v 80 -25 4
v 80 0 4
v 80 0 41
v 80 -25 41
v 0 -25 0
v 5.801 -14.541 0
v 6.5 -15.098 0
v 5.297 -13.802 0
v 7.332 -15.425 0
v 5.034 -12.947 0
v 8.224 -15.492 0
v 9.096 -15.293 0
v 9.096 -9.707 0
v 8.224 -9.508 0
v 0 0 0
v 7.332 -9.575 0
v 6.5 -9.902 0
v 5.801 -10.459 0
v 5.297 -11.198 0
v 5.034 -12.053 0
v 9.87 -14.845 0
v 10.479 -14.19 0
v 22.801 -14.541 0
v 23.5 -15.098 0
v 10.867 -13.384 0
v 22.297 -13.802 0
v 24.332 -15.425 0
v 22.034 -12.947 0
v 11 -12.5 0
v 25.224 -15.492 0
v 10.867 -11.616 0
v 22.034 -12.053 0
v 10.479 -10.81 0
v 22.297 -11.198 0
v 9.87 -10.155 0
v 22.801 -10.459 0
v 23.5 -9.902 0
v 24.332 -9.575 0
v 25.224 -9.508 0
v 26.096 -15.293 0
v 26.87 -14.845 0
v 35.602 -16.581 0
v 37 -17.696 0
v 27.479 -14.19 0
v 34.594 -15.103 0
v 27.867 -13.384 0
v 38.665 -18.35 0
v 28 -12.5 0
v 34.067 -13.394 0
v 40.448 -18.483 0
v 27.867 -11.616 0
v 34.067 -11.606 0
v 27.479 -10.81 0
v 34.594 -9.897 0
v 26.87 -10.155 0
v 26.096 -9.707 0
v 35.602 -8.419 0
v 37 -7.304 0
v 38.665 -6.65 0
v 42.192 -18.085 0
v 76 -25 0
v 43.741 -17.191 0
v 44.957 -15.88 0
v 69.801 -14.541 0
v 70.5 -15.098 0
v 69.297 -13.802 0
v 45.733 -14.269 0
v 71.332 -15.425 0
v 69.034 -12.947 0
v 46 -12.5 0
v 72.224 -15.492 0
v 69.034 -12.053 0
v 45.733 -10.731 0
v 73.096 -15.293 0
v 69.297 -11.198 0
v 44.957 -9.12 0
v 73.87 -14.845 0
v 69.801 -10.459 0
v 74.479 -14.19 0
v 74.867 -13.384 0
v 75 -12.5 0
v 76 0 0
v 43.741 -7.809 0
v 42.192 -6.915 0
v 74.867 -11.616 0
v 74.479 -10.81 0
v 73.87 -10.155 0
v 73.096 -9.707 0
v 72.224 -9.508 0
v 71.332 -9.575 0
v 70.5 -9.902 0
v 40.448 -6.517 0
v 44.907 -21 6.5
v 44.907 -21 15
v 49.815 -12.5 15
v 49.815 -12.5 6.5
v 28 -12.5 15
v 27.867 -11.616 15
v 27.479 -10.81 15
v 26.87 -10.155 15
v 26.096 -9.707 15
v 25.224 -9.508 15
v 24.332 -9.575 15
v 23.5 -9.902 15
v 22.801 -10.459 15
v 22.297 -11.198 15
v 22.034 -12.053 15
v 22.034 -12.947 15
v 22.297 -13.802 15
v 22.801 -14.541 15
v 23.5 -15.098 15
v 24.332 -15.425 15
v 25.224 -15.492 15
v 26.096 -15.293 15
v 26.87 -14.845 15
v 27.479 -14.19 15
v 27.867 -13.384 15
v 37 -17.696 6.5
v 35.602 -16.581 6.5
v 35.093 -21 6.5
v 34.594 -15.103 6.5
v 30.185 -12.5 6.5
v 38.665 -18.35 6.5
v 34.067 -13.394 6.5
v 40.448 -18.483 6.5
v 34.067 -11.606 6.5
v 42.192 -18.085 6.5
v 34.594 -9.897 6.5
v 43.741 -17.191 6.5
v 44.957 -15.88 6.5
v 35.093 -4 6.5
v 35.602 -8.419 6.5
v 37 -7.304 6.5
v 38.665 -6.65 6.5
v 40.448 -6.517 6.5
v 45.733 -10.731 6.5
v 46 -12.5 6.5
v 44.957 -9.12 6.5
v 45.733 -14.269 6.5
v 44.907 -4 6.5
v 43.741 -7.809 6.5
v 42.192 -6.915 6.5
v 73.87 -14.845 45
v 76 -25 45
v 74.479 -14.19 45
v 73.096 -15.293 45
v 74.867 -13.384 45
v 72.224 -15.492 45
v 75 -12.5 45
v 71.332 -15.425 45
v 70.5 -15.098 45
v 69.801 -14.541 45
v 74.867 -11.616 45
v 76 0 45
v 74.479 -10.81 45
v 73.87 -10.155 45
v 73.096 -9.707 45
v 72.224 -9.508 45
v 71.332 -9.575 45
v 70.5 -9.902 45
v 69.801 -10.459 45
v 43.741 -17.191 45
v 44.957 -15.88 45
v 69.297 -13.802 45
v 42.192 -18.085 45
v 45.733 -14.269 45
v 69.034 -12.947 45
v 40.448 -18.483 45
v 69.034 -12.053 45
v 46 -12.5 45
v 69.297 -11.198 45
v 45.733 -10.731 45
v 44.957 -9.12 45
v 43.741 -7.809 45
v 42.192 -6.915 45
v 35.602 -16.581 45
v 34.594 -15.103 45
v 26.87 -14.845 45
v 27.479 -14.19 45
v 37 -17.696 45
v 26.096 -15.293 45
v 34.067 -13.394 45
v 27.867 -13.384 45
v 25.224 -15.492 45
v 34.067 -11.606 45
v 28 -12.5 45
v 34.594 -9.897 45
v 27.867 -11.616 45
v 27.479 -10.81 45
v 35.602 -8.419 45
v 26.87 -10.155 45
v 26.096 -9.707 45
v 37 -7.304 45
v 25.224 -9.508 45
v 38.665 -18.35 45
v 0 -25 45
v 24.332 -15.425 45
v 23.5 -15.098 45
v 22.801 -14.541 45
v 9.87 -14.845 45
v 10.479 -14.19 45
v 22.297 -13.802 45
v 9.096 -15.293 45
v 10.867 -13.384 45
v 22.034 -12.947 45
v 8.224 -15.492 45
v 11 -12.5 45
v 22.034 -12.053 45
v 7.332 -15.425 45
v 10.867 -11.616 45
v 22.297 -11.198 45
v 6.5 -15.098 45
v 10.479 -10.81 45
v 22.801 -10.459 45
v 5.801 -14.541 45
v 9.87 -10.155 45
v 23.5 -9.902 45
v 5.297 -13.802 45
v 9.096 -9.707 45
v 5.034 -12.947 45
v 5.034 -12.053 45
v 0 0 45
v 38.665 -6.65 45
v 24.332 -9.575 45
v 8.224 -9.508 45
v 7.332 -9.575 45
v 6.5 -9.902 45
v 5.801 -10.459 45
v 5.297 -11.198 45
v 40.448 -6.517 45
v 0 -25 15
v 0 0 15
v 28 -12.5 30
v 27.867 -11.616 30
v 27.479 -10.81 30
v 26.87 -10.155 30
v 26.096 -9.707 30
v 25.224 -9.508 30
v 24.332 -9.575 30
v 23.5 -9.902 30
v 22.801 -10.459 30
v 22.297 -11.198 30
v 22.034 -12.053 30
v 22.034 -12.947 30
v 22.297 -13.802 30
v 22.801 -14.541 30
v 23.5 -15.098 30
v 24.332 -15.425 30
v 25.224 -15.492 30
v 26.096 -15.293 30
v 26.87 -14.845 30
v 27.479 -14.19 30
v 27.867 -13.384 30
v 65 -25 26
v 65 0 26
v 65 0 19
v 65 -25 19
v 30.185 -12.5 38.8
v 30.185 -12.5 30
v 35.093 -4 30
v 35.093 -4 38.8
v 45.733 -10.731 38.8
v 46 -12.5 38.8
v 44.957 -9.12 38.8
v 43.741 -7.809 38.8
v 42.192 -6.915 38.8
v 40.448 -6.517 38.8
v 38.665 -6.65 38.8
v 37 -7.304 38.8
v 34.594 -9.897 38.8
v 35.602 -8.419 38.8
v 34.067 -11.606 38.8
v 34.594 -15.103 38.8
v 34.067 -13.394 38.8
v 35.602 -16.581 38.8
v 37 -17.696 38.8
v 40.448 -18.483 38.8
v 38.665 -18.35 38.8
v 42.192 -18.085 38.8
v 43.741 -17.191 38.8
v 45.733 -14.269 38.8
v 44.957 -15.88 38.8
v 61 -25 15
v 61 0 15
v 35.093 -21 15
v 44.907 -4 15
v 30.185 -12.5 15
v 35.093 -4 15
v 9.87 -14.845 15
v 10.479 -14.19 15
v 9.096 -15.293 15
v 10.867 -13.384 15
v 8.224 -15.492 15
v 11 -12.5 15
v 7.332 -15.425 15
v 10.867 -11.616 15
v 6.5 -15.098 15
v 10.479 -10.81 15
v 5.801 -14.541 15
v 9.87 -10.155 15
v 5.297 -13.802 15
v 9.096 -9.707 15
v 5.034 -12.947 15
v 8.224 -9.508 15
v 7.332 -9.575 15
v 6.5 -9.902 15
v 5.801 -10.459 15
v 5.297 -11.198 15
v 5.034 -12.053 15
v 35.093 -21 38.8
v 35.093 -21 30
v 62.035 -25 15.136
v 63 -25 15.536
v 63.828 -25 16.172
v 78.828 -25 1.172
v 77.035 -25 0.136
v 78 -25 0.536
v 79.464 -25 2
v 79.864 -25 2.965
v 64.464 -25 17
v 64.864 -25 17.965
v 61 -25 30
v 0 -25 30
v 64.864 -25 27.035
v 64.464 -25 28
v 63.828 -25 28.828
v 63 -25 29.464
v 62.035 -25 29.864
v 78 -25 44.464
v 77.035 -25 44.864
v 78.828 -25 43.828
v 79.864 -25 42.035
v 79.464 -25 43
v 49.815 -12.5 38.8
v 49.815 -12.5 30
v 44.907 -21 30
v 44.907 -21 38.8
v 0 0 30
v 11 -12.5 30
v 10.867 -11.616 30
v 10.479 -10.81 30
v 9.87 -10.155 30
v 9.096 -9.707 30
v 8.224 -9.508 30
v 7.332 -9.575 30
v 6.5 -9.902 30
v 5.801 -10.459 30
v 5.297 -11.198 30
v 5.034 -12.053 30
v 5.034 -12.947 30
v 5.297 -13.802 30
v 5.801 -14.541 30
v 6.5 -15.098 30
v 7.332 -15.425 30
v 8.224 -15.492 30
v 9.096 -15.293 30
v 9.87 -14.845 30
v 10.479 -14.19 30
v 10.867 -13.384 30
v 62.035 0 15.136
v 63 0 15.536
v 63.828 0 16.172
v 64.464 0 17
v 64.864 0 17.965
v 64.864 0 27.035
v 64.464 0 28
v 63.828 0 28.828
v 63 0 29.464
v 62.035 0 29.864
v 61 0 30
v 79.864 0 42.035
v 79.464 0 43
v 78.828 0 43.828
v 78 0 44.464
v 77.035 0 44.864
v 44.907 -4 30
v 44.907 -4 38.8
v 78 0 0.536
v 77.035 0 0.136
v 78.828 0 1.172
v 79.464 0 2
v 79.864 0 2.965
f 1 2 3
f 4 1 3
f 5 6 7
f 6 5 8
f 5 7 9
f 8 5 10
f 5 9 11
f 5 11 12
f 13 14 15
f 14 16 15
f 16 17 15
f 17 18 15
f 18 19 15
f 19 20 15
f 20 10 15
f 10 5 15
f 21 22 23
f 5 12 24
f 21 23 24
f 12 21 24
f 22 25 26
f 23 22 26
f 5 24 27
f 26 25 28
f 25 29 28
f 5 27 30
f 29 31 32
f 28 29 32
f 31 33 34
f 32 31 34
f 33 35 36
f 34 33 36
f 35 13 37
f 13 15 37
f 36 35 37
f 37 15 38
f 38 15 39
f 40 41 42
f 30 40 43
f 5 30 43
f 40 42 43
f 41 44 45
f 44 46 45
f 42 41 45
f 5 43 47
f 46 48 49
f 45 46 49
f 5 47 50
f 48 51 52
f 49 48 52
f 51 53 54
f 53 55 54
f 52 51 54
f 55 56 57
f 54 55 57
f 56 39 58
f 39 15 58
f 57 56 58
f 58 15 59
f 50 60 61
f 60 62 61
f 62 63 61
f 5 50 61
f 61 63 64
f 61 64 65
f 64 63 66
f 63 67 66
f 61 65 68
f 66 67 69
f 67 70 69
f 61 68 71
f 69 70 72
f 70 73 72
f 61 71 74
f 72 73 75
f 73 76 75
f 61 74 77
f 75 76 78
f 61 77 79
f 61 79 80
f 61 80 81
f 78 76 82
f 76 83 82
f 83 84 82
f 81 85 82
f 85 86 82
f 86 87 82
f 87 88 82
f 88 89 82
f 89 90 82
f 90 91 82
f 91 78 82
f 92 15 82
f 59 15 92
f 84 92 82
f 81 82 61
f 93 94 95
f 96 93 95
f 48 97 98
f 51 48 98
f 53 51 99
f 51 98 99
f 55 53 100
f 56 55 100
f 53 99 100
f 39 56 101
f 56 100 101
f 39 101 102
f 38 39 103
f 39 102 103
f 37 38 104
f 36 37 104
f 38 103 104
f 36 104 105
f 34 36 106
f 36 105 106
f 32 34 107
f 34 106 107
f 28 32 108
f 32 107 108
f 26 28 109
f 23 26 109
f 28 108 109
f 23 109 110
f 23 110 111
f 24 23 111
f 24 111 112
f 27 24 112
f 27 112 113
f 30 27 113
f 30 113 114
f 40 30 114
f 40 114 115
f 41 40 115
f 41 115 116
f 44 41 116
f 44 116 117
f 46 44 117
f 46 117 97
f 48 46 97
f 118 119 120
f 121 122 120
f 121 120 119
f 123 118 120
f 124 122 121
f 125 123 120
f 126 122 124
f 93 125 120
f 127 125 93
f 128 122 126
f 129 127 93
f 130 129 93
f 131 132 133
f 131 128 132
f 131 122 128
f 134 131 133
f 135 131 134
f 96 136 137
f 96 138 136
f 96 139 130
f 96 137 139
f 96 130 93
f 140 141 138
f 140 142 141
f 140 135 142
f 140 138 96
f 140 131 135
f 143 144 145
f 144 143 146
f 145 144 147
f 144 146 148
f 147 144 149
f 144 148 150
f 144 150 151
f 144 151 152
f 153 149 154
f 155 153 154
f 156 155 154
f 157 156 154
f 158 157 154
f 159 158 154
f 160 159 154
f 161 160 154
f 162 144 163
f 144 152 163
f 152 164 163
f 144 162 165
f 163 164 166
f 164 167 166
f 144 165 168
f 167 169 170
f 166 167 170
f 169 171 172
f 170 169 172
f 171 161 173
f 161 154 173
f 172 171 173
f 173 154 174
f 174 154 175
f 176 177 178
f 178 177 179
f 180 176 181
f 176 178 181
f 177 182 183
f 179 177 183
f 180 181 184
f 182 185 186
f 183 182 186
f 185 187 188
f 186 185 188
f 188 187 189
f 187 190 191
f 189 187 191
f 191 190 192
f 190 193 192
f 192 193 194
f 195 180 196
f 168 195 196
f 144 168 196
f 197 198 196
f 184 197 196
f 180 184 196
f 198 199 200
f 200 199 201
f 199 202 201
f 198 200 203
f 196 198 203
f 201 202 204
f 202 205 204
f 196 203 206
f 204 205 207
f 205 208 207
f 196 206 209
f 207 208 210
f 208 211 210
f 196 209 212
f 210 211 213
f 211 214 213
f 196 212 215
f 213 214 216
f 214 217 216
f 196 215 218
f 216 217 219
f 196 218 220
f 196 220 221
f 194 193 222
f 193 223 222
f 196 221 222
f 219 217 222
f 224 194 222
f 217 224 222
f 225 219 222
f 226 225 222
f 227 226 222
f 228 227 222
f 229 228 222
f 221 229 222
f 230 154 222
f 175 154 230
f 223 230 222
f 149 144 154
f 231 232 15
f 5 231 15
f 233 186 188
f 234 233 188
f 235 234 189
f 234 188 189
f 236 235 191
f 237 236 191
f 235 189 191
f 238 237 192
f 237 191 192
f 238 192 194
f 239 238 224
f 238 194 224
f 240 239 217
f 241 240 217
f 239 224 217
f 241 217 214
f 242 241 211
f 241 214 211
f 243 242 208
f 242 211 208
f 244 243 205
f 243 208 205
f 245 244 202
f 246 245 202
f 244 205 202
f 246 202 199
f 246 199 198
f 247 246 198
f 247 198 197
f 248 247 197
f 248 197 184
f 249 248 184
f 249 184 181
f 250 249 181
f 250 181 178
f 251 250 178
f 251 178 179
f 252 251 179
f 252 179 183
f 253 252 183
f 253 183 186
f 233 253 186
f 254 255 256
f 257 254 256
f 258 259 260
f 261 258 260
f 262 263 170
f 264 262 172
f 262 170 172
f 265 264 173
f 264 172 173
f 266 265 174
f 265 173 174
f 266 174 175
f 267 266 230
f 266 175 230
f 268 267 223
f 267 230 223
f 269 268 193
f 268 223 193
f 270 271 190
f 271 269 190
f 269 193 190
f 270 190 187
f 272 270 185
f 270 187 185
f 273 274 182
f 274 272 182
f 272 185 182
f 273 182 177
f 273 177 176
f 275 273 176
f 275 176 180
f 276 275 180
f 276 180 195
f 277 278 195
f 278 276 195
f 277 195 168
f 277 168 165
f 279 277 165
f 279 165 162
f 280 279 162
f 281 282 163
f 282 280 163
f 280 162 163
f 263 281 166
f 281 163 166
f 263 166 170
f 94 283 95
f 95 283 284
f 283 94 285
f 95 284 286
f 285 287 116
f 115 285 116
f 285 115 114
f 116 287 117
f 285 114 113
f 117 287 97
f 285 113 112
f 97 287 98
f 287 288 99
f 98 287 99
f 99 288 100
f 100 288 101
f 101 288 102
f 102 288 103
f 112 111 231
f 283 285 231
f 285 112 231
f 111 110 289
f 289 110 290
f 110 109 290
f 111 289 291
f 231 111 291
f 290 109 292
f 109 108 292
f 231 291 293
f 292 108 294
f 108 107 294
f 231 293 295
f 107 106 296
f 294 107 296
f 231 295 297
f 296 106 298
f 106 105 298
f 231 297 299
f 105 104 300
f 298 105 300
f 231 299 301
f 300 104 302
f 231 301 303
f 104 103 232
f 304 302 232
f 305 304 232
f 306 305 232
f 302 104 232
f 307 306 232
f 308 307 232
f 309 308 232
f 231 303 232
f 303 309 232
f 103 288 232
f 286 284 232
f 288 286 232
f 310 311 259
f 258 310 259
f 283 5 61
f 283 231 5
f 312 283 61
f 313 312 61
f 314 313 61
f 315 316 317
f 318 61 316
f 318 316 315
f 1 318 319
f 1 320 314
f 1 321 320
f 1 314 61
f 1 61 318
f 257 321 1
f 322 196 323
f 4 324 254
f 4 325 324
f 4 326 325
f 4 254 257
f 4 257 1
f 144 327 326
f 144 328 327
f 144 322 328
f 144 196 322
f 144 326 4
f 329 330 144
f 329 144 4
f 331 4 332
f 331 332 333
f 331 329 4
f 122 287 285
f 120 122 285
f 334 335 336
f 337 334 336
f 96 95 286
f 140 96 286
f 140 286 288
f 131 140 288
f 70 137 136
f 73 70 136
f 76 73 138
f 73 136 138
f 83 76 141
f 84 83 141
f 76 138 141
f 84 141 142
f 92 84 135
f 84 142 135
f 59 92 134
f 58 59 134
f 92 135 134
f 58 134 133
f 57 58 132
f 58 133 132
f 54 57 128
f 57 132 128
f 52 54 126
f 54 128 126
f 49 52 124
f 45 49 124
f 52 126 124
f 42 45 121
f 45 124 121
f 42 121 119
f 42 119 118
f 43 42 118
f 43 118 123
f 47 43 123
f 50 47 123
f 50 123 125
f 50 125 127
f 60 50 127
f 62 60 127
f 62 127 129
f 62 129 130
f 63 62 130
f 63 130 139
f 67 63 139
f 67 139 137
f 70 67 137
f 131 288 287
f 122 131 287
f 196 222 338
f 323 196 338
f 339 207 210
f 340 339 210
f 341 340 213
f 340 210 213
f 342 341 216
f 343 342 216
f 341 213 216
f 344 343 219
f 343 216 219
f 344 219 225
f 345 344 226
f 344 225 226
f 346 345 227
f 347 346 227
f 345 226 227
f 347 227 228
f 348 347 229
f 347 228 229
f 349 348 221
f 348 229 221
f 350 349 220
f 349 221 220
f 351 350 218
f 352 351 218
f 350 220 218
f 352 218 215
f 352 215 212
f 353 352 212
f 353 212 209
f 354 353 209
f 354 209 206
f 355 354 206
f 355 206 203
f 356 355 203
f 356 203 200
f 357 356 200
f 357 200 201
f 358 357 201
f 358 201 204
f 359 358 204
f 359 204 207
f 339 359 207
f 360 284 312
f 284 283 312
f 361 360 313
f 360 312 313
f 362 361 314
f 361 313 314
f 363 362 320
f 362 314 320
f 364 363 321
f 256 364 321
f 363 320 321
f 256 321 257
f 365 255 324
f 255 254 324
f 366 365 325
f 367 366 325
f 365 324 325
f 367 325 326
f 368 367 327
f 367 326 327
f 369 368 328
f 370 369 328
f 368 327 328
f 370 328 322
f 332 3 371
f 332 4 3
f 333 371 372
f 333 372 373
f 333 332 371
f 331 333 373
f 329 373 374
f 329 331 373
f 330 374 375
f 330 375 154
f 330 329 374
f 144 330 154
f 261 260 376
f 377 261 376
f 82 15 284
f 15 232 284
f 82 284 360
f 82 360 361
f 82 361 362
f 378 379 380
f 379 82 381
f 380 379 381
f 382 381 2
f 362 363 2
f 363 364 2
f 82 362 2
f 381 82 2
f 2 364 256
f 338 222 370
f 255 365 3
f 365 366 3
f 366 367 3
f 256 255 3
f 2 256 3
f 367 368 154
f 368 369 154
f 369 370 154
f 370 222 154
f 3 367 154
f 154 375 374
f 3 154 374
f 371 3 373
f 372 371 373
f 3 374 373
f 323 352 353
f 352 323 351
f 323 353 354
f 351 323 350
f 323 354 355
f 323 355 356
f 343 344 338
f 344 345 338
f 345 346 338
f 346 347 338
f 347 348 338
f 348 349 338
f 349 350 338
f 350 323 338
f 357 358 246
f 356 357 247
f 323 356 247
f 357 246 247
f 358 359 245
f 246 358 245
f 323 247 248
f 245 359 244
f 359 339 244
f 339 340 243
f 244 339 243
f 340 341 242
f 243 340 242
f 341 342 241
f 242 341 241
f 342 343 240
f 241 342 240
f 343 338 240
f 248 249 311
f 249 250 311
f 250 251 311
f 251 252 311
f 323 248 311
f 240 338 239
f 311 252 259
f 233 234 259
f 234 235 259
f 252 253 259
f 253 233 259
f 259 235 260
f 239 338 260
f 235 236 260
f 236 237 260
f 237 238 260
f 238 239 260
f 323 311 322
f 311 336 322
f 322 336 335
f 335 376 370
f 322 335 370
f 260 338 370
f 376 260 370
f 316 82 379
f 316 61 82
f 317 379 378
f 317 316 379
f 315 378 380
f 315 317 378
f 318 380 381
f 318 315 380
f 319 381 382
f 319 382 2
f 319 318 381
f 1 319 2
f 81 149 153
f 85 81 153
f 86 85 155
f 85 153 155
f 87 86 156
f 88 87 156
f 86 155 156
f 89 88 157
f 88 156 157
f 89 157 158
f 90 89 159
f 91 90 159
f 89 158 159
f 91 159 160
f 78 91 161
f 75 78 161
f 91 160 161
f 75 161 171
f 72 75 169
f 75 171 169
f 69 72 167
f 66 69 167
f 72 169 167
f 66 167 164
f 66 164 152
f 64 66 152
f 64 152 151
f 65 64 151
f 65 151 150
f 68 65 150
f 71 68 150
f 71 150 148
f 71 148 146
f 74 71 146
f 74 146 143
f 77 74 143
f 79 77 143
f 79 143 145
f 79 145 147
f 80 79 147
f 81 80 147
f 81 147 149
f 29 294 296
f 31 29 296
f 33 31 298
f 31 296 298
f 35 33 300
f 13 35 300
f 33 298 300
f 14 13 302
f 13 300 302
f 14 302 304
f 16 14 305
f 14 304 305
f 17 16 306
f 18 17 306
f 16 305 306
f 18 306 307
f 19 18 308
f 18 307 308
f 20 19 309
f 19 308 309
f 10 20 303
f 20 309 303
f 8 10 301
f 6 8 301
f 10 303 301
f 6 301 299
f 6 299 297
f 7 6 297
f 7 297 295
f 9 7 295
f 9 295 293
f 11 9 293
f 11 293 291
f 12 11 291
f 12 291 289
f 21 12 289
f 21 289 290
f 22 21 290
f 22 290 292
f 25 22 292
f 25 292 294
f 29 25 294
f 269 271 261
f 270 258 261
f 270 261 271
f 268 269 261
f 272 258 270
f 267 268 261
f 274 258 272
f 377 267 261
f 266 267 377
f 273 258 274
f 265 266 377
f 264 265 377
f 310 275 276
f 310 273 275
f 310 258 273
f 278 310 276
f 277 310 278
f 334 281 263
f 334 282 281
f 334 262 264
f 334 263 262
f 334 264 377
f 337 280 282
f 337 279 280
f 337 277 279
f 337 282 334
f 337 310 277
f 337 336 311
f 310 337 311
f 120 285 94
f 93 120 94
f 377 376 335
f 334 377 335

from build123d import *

# Parameters (mm, degrees)
F1_DEPTH = 25
F2_R     = 6
F2_R_2   = 3
F3_DEPTH = 45.001
F4_R     = 6
F5_DEPTH = 8.8
F6_R     = 6
F7_DEPTH = 8.5
F8_R     = 4


with BuildPart() as f1:
    # F0 (on Front) → F1 (new body)
    with BuildSketch(Plane.XZ):
        Polygon((0, 15), (0, 0), (80, 0), (80, 45), (0, 45), (0, 30), (65, 30), (65, 15), align=None)
    extrude(amount=F1_DEPTH)

    # F2 (on face) → F3 (cut, through all)
    with BuildSketch(Plane.XY.offset(45)):
        with Locations((40, -12.5)):
            Circle(F2_R)
        with Locations((8, -12.5)):
            Circle(F2_R_2)
        with Locations((25, -12.5)):
            Circle(F2_R_2)
        with Locations((72, -12.5)):
            Circle(F2_R_2)
    extrude(amount=-F3_DEPTH, mode=Mode.SUBTRACT)

    # F4 (on face) → F5 (cut)
    with BuildSketch(Plane(origin=(0, 0, 30), x_dir=(1, 0, 0), z_dir=(0, 0, -1))):
        Polygon((35.092523, 4), (44.907477, 4), (49.814955, 12.5), (44.907477, 21), (35.092523, 21), (30.185045, 12.5), align=None)
        with Locations((40, 12.5)):
            Circle(F4_R, mode=Mode.SUBTRACT)
    extrude(amount=-F5_DEPTH, mode=Mode.SUBTRACT)

    # F6 (on face) → F7 (cut)
    with BuildSketch(Plane.XY.offset(15)):
        Polygon((35.092523, -21), (44.907477, -21), (49.814955, -12.5), (44.907477, -4), (35.092523, -4), (30.185045, -12.5), align=None)
        with Locations((40, -12.5)):
            Circle(F6_R, mode=Mode.SUBTRACT)
    extrude(amount=-F7_DEPTH, mode=Mode.SUBTRACT)

    # F8
    f8_edges = [f1.edges().sort_by_distance(p)[0] for p in [
        (80, -12.5, 45),
        (80, -12.5, 0),
        (65, -12.5, 30),
        (65, -12.5, 15),
    ]]
    fillet(f8_edges, radius=F8_R)


solid = f1.part
